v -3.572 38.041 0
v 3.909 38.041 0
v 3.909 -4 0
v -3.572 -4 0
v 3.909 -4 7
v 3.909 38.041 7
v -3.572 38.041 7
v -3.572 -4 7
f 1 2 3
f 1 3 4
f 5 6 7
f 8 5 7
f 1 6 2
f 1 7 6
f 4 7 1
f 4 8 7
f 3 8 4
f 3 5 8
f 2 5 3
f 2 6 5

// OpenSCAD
// file: glyph.scad
// glyph — the shared geometry of every letter in the set. Defines named geometry
// only, so it renders nothing on its own; each letter part includes it and calls
// letter(). Every dimension lives in ../../lib/common.scad.
//
// A LETTER IS NOTHING BUT A LETTER. No plinth, no tongue, no tab — it is the
// bare glyph, and it attaches by standing in the deck groove and resting on the
// groove's floor. Anything else on it would be a distraction on a learning toy.
//
// It is a flat plate of one thickness, printed face-down: no overhang anywhere,
// no supports, and the face on the bed comes out smoothest.
//
// TWO TRAPS WITH text():
//
//  * A missing font FALLS BACK SILENTLY — no warning, no error, just different
//    letters. "Liberation Sans" was the first choice here because OpenSCAD
//    bundles it; on macOS the bundled faces are not registered with fontconfig,
//    so it rendered the fallback face instead and nothing said so. To check a
//    font resolved, render a string with it and with a deliberately bogus name
//    and compare bounding boxes: identical means it fell back.
//  * `size` is not the cap height in general. For Helvetica Bold they coincide
//    (size 44 -> 44.0 mm cap), which is why letter_size reads as a height.
//    Change the font and re-measure.

include <../../lib/common.scad>

// The letter's outline, upright in the XY plane, ready to be extruded along Z
// (which is the letter's thickness, and the print's build axis).
//
//   y = 0   is the deck surface
//   y < 0   is the part standing down inside the groove. It reaches letter_bury,
//           which is where the tapered groove closes to letter_t — NOT the
//           groove's floor. The letter wedges; it never bottoms out.
module glyph_2d(ch) {
    intersection() {
        translate([0, -letter_bury])
            scale([letter_condense, 1])
                text(ch, size = letter_size, font = letter_font,
                     halign = "center", valign = "baseline");
        // Trimmed flat at the baseline. Round letters (O, C, G, S) overshoot the
        // baseline by design, and a letter standing on a convex curve rocks —
        // there is nothing to stop it leaning. The trim costs nothing visible
        // and gives every letter a flat foot on the groove floor.
        translate([-200, -letter_bury]) square([400, 400]);
    }
}

// One letter, in its print orientation: lying on its face, thickness up Z.
module letter(ch) {
    linear_extrude(letter_t) glyph_2d(ch);
}

// Where that letter sits once it is dropped into a chassis, for fit checks.
module letter_fitted(ch) {
    translate([0, letter_t/2, body_top]) rotate([90, 0, 0]) letter(ch);
}
// main file
// letter I — one part. See glyph.scad for the geometry and lib/common.scad for
// the dimensions. Prints lying on its face, exactly as exported: no supports.

include <glyph.scad>

letter("I");
